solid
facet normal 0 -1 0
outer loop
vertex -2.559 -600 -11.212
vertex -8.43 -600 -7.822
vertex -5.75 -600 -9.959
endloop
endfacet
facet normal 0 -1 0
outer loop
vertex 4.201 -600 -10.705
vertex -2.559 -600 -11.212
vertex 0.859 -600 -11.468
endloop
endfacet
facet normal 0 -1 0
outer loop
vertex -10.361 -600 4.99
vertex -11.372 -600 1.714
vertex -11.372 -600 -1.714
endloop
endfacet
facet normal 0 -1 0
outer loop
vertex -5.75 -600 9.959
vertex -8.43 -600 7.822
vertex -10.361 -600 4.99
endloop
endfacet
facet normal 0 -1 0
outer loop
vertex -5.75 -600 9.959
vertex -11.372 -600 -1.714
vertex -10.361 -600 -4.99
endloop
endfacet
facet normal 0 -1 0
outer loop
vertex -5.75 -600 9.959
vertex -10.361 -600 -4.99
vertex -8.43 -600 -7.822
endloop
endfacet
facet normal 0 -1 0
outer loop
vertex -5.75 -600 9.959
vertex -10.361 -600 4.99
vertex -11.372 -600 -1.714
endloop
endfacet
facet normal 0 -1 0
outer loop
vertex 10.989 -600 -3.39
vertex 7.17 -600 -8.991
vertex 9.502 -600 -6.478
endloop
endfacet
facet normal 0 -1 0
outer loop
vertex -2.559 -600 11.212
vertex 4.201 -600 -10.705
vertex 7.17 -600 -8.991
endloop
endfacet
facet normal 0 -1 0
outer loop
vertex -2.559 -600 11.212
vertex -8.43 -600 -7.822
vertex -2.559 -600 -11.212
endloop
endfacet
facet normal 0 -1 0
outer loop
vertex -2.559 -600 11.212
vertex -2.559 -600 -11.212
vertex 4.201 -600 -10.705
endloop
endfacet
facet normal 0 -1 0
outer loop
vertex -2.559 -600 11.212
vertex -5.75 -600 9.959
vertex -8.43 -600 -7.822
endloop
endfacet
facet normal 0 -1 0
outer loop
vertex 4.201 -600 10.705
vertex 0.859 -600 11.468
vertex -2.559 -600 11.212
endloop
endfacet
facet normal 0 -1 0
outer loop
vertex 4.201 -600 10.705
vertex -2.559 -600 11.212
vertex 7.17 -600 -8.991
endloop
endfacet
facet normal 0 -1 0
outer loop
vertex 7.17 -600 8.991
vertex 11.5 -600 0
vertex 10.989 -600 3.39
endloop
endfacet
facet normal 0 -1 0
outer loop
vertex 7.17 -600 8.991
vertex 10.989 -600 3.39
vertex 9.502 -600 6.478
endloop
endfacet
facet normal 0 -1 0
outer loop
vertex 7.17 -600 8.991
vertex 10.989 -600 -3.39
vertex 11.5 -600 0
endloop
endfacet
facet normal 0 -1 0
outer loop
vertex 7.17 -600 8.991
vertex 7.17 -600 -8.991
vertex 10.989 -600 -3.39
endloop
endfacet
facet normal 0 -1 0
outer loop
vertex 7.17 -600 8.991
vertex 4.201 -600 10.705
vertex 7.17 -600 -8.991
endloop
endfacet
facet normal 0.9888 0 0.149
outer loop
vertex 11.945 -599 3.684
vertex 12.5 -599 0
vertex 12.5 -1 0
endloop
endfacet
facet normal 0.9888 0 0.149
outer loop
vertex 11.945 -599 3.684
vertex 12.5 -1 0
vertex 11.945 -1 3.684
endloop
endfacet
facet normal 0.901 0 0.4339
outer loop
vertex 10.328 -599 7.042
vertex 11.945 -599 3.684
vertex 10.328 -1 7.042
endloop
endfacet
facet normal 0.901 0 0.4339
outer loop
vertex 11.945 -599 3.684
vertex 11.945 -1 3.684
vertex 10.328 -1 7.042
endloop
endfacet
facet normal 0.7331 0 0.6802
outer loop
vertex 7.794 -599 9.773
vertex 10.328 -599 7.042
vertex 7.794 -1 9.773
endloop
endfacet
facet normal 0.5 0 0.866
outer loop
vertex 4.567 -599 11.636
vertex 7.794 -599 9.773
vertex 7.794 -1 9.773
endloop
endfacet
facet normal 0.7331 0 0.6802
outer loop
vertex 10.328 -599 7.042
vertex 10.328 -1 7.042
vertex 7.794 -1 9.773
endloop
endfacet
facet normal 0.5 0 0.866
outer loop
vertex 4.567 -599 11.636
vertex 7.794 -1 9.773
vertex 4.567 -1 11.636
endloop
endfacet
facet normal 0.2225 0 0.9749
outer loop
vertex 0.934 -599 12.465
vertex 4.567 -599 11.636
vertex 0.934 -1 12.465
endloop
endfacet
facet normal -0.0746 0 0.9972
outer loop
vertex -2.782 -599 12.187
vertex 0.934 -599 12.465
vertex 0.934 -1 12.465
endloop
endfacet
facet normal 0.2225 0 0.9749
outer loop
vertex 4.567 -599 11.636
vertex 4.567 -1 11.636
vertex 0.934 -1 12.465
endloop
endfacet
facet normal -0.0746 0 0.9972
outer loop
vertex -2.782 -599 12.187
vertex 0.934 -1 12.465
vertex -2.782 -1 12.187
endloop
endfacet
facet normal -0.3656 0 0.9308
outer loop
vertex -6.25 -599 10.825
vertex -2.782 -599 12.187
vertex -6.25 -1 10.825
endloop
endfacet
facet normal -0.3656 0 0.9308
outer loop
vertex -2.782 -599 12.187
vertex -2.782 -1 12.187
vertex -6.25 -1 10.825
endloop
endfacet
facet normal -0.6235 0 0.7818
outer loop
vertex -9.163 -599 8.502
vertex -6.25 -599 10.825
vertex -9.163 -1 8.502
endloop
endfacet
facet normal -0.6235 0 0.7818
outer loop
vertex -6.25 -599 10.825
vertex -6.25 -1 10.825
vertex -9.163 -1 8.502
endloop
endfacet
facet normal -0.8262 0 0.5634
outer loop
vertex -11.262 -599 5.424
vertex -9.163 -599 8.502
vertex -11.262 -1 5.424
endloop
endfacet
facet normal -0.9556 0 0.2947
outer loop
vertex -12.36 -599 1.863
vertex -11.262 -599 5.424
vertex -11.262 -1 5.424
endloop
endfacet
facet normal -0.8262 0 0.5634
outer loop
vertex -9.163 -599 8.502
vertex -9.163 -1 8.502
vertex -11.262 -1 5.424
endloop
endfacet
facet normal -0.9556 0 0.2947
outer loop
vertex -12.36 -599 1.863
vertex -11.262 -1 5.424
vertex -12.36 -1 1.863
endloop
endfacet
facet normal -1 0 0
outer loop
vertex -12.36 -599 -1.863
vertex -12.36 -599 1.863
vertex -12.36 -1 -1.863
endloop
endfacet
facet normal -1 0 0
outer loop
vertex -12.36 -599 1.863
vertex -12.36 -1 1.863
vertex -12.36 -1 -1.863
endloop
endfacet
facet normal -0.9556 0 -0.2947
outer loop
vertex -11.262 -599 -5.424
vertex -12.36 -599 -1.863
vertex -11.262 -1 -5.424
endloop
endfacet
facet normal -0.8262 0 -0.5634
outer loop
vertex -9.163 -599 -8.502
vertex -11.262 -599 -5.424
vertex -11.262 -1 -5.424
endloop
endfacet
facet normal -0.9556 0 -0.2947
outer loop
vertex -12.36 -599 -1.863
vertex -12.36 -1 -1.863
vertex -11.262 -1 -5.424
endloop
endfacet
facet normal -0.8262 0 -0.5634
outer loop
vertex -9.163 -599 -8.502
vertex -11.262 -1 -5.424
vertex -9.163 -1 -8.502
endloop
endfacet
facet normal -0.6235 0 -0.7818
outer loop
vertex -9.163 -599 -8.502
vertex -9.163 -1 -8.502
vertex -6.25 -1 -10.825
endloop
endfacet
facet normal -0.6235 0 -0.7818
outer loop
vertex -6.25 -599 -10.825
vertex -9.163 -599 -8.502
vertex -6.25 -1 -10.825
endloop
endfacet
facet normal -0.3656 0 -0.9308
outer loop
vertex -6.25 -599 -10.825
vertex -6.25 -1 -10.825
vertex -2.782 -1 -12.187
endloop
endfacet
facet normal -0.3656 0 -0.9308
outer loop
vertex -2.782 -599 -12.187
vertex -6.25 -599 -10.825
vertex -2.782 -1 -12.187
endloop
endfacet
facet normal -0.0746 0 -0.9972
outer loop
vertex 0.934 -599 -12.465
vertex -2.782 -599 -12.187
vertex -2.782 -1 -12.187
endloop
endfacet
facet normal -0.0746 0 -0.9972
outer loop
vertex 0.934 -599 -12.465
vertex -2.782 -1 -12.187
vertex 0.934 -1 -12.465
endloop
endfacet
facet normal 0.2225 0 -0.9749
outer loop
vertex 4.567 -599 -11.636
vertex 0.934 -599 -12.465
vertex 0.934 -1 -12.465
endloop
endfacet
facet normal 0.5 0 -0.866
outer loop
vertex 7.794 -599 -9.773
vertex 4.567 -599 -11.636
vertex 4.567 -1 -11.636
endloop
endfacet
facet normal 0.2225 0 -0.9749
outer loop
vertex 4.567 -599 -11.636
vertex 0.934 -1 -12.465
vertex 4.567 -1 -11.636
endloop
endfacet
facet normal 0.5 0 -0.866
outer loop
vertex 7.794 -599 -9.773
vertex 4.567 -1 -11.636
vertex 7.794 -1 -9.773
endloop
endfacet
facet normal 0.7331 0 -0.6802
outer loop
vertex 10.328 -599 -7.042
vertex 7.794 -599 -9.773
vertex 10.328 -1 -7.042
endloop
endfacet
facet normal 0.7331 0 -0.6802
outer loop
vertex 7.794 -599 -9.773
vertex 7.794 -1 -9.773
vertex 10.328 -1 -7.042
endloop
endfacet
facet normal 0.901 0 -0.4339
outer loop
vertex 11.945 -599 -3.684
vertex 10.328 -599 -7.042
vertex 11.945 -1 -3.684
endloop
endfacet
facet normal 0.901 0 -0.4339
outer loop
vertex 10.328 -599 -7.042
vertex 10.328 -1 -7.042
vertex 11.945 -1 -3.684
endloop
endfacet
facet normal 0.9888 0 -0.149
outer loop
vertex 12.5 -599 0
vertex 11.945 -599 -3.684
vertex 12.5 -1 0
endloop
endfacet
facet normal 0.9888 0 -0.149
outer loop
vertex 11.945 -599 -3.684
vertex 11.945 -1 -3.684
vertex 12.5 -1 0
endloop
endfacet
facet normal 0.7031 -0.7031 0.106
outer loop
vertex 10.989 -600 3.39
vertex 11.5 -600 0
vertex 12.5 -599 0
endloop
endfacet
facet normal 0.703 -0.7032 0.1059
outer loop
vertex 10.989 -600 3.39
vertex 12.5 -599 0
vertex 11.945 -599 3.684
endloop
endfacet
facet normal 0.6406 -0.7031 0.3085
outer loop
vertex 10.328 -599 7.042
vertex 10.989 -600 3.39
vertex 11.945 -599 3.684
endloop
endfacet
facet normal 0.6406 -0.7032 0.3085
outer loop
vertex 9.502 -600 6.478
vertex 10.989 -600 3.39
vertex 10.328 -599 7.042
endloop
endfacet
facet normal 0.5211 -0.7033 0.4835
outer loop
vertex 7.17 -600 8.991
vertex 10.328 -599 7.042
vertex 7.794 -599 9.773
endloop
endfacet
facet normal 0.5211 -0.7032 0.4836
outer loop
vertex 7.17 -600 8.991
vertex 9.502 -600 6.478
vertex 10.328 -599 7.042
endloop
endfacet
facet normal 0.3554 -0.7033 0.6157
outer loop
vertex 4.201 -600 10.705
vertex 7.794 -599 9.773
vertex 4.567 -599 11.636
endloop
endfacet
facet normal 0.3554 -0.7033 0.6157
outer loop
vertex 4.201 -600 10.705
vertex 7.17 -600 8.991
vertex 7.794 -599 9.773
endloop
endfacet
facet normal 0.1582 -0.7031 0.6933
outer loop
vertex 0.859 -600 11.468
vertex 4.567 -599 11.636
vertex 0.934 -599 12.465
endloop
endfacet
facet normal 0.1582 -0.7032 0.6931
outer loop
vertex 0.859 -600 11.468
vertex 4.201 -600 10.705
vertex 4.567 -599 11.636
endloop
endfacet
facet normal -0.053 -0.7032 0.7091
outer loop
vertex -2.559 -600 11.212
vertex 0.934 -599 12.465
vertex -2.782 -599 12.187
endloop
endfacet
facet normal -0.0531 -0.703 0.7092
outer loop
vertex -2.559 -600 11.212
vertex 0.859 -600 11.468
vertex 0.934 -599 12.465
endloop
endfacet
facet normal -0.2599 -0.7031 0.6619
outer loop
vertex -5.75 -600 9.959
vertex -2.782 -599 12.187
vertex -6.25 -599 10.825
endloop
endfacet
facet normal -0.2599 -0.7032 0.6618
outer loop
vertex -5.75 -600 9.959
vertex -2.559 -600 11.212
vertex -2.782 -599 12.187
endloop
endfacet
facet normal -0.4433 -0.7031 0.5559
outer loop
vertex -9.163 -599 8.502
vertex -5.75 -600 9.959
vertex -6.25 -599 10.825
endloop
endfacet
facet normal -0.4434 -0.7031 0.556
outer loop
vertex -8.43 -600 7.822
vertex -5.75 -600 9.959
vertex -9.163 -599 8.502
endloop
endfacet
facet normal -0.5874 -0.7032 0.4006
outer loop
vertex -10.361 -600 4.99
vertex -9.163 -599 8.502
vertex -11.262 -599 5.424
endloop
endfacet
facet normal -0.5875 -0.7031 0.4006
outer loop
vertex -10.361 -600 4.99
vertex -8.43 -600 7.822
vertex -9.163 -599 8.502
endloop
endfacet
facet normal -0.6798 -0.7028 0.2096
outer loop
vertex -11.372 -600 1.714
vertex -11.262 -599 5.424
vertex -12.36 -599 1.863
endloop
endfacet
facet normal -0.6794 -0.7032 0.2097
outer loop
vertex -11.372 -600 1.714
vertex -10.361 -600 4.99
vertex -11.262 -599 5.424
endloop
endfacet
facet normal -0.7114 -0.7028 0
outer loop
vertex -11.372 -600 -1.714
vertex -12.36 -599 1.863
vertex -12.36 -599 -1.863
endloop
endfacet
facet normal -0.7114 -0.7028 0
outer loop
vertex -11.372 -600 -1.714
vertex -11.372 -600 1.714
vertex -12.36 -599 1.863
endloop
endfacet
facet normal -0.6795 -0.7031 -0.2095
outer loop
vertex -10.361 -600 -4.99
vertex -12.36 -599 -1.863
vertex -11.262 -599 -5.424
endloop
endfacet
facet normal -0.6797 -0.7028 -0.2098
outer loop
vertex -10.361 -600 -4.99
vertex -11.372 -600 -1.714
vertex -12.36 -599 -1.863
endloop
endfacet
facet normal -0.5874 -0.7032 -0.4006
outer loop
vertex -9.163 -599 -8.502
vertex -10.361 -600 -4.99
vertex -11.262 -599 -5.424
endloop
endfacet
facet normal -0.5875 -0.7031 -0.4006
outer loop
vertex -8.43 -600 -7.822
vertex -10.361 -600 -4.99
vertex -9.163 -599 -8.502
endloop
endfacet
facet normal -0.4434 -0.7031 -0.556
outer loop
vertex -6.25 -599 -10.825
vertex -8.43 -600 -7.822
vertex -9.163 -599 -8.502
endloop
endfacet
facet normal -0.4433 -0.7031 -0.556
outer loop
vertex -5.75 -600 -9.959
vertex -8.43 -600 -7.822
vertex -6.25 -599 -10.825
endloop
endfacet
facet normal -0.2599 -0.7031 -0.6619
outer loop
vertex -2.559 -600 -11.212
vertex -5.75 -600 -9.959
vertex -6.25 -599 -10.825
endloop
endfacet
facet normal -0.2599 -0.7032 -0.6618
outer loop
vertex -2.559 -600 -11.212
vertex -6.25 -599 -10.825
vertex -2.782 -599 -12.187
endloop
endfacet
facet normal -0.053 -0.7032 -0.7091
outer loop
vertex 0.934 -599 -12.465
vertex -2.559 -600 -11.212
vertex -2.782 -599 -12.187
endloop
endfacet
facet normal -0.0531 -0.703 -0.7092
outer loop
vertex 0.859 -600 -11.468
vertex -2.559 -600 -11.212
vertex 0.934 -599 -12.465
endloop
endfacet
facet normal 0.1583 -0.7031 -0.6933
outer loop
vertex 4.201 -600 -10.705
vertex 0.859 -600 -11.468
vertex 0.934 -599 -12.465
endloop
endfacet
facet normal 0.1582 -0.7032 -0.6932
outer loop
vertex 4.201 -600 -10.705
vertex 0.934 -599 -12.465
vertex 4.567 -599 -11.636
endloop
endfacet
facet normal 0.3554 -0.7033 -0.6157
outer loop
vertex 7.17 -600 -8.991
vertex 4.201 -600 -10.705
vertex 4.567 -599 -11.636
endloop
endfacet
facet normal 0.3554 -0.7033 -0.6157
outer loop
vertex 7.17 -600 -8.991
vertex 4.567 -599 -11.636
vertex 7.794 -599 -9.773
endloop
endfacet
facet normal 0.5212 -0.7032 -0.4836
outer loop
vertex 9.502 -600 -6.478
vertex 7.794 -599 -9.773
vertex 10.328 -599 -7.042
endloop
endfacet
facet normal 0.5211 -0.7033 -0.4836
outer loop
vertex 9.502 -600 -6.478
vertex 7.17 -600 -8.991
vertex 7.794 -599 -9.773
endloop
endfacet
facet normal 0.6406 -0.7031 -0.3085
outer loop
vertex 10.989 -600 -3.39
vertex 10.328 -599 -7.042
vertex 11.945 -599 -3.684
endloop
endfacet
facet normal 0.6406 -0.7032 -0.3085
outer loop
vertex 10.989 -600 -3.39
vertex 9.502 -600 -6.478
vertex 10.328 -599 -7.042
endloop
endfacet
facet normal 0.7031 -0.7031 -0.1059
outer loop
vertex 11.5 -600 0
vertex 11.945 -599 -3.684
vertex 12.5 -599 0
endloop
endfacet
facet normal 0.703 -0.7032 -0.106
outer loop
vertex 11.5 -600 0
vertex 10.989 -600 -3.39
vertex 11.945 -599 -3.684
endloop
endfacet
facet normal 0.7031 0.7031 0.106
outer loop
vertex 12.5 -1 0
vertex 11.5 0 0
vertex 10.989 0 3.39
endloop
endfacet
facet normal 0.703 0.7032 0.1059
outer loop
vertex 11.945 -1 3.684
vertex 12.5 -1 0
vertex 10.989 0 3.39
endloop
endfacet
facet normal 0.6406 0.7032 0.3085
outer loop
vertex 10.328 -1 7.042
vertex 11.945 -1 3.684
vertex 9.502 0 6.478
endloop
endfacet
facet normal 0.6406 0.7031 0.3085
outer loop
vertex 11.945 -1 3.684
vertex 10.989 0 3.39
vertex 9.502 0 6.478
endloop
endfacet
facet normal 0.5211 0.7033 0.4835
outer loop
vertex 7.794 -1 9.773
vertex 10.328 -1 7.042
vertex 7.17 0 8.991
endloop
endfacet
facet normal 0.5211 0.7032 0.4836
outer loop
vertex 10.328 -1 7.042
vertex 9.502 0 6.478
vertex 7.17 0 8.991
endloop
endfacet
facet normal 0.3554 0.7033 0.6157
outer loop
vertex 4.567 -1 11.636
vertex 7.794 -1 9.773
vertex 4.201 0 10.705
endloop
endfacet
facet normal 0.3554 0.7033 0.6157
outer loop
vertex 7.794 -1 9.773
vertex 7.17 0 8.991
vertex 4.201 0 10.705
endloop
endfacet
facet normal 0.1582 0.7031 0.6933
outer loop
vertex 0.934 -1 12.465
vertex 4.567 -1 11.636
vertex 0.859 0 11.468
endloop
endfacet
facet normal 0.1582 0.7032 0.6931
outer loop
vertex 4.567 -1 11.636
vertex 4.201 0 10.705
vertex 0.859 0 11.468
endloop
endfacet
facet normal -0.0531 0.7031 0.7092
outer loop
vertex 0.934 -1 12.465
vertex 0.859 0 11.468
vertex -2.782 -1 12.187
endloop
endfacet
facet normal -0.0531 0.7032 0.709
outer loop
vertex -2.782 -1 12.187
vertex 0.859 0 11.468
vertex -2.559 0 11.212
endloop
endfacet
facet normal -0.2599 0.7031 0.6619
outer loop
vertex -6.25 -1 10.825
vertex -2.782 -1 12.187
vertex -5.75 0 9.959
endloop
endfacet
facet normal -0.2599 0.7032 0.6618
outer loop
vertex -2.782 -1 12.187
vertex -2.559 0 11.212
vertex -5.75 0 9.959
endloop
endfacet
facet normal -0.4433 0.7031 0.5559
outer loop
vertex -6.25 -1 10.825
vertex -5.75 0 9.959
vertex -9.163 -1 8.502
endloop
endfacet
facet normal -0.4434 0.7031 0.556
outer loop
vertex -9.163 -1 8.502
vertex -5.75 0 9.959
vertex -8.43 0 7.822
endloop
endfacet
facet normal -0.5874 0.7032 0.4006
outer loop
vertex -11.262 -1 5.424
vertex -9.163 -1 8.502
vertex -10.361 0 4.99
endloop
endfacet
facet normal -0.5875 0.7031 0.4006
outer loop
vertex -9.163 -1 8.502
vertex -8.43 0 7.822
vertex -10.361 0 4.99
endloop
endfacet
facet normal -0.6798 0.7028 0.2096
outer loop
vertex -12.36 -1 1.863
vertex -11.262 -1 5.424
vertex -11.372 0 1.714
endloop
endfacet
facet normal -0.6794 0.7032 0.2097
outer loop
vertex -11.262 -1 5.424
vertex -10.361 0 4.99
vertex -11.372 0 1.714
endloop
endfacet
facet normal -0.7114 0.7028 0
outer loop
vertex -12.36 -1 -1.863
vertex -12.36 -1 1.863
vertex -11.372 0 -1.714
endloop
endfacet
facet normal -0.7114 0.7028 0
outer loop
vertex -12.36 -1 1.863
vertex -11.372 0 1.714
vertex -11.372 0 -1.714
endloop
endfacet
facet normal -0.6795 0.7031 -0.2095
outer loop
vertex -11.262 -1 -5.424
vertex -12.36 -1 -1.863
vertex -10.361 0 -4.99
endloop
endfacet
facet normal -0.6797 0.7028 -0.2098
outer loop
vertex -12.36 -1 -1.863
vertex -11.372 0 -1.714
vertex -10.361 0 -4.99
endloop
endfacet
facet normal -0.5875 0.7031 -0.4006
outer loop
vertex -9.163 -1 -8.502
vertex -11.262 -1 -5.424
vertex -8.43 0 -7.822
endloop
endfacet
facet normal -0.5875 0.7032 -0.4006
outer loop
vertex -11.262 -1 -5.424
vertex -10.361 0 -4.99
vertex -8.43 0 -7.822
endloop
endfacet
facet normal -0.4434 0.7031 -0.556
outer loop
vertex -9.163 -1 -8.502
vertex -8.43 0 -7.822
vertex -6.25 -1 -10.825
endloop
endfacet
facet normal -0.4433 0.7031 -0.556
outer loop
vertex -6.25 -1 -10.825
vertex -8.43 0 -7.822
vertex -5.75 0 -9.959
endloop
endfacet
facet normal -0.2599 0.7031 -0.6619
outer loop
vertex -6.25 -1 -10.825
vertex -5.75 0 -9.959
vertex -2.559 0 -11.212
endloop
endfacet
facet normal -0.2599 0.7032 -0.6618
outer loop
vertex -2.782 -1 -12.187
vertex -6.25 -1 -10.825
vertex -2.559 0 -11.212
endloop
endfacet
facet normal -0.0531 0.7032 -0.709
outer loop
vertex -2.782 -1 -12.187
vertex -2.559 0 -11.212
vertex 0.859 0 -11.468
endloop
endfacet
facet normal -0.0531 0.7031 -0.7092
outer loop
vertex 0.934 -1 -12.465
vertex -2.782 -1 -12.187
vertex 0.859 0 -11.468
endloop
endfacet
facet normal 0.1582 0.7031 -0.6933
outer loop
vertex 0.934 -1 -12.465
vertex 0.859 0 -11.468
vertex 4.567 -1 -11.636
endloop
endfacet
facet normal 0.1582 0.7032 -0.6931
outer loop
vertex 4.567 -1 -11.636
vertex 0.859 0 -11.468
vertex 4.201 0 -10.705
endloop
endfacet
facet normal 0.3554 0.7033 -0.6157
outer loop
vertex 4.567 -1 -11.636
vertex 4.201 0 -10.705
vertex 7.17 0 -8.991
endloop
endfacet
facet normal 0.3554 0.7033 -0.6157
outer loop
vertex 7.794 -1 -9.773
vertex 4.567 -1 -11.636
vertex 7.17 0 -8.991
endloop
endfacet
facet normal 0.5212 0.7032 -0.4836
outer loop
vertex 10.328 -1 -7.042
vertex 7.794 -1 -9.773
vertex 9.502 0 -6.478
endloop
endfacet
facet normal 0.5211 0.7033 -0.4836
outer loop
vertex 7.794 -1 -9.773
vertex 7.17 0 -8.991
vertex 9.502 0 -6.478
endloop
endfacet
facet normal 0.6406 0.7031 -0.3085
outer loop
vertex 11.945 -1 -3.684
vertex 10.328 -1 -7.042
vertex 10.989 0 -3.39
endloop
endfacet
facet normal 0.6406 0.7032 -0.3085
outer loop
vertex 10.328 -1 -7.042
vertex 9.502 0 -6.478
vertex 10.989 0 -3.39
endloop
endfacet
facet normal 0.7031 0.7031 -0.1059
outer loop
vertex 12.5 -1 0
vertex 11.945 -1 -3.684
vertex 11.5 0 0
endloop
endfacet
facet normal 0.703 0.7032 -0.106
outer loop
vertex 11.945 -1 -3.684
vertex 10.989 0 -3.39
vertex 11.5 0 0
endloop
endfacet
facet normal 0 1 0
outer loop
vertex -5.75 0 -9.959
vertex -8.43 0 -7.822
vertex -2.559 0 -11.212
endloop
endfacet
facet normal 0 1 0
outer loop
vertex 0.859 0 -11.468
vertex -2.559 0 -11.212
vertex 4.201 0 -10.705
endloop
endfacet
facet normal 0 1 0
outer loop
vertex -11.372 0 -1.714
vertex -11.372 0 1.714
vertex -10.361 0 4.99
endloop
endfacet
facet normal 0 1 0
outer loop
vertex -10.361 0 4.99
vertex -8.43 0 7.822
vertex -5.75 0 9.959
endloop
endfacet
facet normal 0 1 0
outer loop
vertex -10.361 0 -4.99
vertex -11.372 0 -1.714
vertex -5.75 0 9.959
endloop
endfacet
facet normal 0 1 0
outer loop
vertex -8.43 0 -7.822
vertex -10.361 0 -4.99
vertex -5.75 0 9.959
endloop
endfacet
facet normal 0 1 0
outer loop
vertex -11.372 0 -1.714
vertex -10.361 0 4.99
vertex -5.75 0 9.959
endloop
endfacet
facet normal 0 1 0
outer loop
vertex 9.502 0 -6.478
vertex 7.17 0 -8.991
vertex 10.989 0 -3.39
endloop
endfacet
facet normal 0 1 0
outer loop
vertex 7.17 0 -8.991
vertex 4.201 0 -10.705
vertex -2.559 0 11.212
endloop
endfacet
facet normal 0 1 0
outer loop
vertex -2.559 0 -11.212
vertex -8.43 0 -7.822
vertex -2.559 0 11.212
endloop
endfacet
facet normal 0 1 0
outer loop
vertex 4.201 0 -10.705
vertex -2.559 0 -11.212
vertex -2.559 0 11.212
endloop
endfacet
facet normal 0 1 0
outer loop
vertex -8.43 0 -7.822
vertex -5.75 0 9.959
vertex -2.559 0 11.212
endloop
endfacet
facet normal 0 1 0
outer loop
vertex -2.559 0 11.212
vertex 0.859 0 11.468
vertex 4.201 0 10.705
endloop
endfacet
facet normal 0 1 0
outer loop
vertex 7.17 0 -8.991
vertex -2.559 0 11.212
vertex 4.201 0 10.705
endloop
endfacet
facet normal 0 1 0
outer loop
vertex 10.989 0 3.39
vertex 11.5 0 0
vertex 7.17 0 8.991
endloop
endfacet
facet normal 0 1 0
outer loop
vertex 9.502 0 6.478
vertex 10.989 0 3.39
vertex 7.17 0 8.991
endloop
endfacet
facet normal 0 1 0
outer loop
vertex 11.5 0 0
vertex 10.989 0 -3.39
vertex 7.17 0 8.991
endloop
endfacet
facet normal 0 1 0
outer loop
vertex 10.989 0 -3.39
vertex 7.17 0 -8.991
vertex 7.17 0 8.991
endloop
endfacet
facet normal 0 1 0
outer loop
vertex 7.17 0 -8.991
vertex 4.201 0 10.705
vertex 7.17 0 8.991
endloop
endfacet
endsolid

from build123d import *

# Parameters (mm, degrees)
F0_R     = 12.5
F1_DEPTH = 600
F2_SIZE  = 1
F3_SIZE  = 1


with BuildPart() as f1:
    # F0 (on Front) → F1 (new body)
    with BuildSketch(Plane.XZ):
        Circle(F0_R)
    extrude(amount=F1_DEPTH)

    # F2
    f2_edges = [f1.edges().sort_by_distance(p)[0] for p in [
        (-12.5, -600, 0),
    ]]
    chamfer(f2_edges, length=F2_SIZE)

    # F3
    f3_edges = [f1.edges().sort_by_distance(p)[0] for p in [
        (-12.5, 0, 0),
    ]]
    chamfer(f3_edges, length=F3_SIZE)


solid = f1.part
